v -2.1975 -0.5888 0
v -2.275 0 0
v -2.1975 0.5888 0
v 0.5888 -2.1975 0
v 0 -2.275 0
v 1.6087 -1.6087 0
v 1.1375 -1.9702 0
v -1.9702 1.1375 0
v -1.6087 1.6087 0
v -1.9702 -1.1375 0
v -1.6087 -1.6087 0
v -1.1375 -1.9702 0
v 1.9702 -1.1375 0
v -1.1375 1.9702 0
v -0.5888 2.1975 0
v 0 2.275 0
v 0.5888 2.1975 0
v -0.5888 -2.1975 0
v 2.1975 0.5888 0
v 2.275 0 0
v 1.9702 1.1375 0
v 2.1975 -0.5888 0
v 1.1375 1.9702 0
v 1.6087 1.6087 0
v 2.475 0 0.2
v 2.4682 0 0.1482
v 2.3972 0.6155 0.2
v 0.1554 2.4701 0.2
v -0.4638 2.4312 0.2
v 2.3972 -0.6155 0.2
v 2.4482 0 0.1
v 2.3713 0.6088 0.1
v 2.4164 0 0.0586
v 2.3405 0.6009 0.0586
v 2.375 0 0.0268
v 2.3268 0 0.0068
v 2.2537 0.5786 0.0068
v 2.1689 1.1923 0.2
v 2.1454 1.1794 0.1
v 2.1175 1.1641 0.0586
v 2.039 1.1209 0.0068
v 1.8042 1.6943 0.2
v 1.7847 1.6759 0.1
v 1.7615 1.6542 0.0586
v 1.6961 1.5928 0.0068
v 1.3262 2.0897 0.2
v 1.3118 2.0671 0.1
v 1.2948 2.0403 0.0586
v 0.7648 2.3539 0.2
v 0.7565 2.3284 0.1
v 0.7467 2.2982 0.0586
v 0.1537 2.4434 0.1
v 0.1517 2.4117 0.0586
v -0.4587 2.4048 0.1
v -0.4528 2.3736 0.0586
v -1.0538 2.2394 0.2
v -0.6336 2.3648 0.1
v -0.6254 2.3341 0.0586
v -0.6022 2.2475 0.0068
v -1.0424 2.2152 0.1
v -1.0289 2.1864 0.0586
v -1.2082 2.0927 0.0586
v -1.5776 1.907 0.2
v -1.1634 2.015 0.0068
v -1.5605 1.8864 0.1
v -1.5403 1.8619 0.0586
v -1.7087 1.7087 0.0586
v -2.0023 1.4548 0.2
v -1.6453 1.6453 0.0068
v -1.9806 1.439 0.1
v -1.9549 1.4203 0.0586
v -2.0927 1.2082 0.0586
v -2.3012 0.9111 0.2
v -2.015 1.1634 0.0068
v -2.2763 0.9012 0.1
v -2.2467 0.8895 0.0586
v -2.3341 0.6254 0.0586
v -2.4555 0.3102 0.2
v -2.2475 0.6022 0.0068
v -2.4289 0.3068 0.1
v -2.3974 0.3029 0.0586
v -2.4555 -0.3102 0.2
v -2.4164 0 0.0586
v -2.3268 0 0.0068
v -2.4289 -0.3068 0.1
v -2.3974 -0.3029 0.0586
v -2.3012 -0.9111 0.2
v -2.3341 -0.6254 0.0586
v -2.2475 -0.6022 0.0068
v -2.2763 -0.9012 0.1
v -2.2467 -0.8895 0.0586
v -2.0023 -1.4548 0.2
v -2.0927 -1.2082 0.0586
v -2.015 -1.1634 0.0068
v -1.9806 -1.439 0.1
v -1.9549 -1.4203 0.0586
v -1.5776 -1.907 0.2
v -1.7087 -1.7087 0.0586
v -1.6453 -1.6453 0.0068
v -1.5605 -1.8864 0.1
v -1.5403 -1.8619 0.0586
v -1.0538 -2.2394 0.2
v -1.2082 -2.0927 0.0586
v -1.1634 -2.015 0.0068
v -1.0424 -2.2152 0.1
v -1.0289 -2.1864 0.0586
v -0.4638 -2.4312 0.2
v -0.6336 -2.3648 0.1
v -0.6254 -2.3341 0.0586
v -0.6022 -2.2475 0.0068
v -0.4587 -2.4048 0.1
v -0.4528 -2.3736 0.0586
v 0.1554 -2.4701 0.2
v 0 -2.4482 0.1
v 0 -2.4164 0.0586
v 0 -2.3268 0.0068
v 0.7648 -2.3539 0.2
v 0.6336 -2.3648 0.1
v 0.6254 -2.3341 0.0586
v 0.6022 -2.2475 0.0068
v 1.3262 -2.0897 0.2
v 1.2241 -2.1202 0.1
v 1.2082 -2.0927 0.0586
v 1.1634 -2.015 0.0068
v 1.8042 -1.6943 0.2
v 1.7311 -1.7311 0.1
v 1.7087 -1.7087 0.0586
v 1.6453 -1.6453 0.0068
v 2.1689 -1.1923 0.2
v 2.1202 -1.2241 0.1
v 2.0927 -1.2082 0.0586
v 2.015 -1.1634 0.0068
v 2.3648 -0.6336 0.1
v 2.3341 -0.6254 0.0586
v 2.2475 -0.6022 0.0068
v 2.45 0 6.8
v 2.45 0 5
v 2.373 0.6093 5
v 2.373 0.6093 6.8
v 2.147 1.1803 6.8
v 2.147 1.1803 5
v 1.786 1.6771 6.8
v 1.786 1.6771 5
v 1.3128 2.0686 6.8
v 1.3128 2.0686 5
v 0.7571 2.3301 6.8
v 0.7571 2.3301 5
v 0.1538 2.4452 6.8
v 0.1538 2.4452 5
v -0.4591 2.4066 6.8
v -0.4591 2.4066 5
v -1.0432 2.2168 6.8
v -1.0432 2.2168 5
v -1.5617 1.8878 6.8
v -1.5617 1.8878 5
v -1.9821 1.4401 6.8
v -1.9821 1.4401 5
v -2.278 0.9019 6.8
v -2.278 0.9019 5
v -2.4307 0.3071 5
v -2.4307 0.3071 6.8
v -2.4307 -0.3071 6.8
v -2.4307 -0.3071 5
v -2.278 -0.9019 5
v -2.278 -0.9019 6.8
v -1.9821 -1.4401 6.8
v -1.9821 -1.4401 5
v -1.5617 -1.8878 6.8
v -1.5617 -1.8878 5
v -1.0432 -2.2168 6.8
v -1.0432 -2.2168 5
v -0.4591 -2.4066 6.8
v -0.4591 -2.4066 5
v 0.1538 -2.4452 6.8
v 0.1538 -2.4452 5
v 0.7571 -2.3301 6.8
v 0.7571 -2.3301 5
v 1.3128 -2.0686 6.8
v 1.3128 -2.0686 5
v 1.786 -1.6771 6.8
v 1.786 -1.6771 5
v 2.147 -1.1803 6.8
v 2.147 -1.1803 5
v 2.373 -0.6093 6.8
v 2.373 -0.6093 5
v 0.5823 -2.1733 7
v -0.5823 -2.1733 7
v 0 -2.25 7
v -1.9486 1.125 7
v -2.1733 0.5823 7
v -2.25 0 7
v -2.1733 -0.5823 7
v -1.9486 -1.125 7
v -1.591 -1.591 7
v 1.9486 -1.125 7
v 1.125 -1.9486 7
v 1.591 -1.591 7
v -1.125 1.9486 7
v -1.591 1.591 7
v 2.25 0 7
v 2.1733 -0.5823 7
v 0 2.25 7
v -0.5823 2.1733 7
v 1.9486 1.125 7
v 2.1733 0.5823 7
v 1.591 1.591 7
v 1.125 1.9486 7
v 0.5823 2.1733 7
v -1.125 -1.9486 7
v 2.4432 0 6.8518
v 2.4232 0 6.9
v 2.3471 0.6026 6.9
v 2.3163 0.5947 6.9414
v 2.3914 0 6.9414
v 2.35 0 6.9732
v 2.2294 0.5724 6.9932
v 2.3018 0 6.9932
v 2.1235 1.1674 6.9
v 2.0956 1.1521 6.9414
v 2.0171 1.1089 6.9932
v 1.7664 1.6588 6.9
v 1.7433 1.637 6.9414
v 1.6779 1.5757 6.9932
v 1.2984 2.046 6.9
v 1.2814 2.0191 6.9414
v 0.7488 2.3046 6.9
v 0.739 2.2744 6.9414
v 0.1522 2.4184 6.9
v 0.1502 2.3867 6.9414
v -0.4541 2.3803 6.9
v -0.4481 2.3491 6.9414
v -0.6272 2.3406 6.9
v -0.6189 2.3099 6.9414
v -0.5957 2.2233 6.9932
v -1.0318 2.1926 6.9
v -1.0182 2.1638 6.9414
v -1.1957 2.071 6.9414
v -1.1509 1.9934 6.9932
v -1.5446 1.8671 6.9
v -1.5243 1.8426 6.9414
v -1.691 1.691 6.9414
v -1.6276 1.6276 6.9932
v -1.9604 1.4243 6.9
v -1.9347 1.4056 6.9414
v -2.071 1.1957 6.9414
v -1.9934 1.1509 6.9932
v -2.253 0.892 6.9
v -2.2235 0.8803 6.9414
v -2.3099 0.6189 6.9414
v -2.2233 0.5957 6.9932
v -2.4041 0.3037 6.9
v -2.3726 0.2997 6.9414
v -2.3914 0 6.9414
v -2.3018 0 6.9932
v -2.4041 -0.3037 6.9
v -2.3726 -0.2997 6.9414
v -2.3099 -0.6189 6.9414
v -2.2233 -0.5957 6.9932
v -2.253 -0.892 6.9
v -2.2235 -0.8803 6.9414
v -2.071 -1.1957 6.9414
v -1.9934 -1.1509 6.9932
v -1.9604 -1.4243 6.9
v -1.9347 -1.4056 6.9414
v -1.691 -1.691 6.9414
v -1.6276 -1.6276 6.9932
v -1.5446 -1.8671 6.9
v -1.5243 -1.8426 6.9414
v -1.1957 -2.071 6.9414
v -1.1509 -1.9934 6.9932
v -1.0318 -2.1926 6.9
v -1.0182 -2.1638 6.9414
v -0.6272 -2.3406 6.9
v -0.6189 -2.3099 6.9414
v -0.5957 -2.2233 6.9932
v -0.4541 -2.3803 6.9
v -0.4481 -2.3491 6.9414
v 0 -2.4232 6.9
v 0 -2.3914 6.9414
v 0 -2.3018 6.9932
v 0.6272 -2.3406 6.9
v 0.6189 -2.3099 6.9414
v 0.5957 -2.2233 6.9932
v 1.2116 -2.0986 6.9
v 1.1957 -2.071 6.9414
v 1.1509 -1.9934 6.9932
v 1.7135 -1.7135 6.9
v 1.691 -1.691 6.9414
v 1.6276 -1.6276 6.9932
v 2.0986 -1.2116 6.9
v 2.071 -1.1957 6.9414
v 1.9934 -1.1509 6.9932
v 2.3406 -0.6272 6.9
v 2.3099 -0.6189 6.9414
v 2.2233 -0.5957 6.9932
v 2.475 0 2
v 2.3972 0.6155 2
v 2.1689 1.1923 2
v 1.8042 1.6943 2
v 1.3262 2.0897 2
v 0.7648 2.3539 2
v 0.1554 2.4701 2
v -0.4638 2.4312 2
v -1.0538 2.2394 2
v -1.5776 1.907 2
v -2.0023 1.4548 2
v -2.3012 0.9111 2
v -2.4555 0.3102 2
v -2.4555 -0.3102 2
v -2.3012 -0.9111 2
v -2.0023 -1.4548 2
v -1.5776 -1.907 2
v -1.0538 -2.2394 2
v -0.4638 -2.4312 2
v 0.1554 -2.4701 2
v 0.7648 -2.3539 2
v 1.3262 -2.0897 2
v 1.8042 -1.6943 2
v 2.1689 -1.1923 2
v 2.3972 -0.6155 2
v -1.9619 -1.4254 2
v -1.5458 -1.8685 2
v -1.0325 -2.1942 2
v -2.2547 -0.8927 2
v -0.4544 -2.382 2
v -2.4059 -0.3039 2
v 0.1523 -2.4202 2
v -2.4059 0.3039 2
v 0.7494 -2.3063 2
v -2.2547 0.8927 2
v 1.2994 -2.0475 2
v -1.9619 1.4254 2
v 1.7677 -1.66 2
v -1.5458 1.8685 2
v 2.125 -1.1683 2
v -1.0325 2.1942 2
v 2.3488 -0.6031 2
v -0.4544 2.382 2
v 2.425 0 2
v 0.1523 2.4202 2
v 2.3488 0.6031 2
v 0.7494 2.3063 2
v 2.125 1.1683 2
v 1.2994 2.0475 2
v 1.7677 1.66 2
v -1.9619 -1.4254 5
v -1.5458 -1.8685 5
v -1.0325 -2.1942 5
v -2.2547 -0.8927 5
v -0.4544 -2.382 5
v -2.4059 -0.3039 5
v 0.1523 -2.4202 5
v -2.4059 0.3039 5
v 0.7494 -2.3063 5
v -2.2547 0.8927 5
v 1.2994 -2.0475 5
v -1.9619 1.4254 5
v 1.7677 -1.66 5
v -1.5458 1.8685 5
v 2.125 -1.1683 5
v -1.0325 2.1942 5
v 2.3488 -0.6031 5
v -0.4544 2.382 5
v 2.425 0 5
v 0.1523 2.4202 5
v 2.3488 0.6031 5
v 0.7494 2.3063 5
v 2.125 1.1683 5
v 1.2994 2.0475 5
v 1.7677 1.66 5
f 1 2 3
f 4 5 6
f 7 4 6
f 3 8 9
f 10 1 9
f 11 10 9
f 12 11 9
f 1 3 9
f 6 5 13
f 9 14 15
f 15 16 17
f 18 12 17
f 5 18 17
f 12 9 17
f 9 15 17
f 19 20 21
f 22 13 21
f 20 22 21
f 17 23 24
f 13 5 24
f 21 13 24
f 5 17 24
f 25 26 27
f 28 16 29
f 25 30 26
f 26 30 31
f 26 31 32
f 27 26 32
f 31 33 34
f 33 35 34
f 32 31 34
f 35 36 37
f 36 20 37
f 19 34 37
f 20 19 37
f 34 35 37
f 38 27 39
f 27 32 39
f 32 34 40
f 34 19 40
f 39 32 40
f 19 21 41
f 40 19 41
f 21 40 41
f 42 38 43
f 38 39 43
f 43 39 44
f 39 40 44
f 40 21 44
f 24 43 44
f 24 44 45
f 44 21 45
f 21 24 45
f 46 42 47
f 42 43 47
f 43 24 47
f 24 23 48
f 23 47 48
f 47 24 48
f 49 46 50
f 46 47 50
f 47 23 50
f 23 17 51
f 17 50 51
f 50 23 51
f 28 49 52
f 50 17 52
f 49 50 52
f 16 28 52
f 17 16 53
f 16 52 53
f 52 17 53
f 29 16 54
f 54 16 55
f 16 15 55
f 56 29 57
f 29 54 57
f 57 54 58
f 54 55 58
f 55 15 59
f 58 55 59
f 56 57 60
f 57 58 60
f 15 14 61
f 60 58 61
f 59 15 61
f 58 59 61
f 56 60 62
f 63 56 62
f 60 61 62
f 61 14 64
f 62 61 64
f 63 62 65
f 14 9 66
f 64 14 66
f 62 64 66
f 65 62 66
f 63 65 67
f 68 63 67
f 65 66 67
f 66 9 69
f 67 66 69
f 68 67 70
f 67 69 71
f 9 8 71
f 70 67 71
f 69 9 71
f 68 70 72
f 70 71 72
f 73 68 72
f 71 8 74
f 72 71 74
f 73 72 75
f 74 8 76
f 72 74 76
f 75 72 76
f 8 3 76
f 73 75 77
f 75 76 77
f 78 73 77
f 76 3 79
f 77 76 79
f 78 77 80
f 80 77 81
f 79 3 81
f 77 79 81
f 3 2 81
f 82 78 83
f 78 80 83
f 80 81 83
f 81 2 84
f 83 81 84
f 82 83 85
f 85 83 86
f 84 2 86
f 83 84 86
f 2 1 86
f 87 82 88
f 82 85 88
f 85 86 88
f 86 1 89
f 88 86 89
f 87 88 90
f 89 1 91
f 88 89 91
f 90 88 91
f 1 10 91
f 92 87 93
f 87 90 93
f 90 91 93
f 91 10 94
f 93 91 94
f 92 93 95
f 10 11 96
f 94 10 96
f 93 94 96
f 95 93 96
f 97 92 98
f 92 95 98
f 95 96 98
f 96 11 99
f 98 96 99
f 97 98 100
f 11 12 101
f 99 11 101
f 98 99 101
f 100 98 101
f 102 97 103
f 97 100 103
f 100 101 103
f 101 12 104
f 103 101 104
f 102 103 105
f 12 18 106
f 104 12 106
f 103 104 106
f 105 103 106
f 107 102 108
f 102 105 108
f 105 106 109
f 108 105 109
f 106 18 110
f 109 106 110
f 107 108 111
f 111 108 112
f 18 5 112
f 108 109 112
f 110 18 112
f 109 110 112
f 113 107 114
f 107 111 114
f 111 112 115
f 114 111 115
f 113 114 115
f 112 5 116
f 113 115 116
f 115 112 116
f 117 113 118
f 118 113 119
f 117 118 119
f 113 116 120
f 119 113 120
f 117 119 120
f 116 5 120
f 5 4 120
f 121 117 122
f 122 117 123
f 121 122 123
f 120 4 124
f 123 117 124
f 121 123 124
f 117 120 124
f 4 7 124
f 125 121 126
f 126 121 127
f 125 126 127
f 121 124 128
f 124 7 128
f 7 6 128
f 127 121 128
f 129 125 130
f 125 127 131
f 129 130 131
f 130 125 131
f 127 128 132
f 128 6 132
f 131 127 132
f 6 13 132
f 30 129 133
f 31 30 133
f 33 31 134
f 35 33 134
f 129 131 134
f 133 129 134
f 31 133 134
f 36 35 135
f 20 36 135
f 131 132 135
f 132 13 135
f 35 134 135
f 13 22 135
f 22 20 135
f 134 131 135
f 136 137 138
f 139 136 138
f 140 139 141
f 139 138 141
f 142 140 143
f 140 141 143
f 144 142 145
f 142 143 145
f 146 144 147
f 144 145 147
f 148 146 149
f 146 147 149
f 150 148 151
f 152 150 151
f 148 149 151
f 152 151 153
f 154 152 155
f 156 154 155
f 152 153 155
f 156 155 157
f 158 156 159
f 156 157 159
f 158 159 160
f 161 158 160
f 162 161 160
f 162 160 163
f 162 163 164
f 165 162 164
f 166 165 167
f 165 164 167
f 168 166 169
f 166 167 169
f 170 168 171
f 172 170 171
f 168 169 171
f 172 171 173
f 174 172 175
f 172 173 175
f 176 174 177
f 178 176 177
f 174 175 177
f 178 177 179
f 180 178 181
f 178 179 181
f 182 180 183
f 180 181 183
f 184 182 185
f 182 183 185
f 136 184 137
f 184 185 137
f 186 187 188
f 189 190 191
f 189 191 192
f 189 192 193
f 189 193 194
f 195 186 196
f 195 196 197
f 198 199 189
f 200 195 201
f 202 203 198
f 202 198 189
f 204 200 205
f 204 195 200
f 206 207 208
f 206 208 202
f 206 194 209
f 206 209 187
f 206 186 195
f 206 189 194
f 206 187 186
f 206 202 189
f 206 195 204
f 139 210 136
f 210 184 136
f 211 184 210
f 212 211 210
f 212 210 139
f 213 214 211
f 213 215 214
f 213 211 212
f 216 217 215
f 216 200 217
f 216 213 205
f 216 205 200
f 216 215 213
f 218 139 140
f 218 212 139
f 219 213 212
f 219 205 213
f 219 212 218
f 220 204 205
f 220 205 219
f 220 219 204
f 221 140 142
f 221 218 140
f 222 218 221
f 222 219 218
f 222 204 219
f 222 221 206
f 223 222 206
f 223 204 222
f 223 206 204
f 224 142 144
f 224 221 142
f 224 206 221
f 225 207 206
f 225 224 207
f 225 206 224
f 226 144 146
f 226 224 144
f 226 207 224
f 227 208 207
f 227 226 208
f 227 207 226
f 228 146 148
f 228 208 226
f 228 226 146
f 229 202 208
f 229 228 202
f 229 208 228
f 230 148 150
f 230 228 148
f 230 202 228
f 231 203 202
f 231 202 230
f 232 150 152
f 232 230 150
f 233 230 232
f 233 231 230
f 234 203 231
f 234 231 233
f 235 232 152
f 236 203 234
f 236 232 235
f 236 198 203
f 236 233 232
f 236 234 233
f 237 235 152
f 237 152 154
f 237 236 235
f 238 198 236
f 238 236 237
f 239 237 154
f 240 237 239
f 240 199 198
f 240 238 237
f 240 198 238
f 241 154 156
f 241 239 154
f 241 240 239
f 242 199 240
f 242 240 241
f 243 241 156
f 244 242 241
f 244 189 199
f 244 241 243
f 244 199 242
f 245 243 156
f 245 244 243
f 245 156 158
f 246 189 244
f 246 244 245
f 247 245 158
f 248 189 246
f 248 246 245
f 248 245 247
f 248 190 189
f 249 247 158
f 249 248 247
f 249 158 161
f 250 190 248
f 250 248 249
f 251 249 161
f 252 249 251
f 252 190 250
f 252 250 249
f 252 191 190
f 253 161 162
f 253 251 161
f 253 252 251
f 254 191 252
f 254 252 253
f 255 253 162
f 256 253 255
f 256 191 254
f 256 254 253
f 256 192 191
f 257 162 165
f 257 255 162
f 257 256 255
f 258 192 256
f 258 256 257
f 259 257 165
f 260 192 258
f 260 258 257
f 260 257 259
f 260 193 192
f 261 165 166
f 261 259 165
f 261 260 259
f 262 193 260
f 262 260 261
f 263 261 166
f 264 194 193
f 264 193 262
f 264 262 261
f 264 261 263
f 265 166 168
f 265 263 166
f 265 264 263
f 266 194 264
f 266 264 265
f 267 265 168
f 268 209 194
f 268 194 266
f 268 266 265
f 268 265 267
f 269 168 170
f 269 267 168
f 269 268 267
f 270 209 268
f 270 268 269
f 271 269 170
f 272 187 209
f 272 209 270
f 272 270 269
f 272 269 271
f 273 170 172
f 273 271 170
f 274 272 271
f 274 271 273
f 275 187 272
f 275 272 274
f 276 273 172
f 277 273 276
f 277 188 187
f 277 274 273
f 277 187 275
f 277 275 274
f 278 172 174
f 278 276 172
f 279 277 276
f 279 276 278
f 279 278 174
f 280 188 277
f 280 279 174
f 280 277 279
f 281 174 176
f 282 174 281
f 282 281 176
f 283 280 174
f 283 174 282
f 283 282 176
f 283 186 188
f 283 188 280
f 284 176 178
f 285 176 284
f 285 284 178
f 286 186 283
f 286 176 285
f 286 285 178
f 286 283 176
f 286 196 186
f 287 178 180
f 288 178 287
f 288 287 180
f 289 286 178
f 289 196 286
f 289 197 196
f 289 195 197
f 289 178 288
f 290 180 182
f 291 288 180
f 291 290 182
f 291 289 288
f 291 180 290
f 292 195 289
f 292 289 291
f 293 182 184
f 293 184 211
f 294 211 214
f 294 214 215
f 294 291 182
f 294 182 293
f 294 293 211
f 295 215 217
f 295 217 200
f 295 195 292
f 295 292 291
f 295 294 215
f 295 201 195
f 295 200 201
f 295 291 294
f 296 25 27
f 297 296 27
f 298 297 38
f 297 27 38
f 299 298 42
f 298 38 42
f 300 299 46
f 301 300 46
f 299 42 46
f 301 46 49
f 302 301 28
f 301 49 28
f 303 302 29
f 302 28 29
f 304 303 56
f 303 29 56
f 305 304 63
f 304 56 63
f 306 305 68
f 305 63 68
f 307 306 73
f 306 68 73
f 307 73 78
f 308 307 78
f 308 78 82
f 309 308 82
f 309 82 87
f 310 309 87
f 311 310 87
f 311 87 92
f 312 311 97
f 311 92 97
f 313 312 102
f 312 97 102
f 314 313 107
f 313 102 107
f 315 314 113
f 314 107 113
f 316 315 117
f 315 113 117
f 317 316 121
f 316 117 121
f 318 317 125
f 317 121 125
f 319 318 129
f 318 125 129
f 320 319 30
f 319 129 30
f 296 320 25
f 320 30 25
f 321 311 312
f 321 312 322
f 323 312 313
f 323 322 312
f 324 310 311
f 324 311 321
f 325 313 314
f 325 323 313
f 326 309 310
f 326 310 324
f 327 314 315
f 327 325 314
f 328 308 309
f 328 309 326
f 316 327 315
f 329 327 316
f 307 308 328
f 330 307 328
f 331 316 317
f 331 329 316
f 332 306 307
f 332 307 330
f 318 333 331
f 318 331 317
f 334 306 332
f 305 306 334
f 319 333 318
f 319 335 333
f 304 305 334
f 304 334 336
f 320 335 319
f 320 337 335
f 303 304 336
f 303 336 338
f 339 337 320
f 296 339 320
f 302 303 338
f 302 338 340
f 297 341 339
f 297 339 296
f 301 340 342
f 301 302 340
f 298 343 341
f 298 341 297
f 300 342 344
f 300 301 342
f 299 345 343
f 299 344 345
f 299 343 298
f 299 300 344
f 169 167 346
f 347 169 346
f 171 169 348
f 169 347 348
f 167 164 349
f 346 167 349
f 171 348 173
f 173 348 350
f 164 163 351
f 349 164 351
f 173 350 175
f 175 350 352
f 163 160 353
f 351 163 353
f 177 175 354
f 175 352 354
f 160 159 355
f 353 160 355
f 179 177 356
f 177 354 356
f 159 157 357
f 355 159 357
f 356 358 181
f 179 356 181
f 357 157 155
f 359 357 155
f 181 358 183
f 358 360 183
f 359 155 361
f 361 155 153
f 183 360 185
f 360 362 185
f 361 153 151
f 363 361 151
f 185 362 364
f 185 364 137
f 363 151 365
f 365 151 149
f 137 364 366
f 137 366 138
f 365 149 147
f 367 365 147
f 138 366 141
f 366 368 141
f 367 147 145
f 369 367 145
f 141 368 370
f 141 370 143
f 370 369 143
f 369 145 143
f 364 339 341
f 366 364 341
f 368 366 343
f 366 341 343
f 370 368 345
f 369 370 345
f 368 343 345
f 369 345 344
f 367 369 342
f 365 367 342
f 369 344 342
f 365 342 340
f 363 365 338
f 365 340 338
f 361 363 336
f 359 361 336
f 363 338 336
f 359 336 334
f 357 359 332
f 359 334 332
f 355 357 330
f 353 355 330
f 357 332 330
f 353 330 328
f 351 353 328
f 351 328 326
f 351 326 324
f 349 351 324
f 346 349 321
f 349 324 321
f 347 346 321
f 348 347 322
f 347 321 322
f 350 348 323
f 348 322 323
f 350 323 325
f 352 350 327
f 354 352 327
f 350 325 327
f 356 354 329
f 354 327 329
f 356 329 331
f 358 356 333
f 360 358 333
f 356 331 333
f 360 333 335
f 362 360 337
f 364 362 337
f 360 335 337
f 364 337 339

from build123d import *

# Parameters (mm, degrees)
SKETCH_1_R      = 2.475
EXTRUDE_1_DEPTH = 2
SKETCH_2_R      = 2.425
EXTRUDE_2_DEPTH = 3
SKETCH_3_R      = 2.45
EXTRUDE_3_DEPTH = 2
FILLET_1_R      = 0.2


with BuildPart() as part:
    # 스케치1 → 보스-돌출1 (new body)
    with BuildSketch(Plane.XY):
        Circle(SKETCH_1_R)
    extrude(amount=EXTRUDE_1_DEPTH)

    # 스케치2 → 보스-돌출2 (add)
    with BuildSketch(Plane.XY.offset(2)):
        Circle(SKETCH_2_R)
    extrude(amount=EXTRUDE_2_DEPTH)

    # 스케치3 → 보스-돌출3 (add)
    with BuildSketch(Plane.XY.offset(5)):
        Circle(SKETCH_3_R)
    extrude(amount=EXTRUDE_3_DEPTH)

    # 필렛1
    fillet_1_edges = [part.edges().sort_by_distance(p)[0] for p in [
        (-2.475, 0, 0),
        (-2.45, 0, 7),
    ]]
    fillet(fillet_1_edges, radius=FILLET_1_R)


solid = part.part
